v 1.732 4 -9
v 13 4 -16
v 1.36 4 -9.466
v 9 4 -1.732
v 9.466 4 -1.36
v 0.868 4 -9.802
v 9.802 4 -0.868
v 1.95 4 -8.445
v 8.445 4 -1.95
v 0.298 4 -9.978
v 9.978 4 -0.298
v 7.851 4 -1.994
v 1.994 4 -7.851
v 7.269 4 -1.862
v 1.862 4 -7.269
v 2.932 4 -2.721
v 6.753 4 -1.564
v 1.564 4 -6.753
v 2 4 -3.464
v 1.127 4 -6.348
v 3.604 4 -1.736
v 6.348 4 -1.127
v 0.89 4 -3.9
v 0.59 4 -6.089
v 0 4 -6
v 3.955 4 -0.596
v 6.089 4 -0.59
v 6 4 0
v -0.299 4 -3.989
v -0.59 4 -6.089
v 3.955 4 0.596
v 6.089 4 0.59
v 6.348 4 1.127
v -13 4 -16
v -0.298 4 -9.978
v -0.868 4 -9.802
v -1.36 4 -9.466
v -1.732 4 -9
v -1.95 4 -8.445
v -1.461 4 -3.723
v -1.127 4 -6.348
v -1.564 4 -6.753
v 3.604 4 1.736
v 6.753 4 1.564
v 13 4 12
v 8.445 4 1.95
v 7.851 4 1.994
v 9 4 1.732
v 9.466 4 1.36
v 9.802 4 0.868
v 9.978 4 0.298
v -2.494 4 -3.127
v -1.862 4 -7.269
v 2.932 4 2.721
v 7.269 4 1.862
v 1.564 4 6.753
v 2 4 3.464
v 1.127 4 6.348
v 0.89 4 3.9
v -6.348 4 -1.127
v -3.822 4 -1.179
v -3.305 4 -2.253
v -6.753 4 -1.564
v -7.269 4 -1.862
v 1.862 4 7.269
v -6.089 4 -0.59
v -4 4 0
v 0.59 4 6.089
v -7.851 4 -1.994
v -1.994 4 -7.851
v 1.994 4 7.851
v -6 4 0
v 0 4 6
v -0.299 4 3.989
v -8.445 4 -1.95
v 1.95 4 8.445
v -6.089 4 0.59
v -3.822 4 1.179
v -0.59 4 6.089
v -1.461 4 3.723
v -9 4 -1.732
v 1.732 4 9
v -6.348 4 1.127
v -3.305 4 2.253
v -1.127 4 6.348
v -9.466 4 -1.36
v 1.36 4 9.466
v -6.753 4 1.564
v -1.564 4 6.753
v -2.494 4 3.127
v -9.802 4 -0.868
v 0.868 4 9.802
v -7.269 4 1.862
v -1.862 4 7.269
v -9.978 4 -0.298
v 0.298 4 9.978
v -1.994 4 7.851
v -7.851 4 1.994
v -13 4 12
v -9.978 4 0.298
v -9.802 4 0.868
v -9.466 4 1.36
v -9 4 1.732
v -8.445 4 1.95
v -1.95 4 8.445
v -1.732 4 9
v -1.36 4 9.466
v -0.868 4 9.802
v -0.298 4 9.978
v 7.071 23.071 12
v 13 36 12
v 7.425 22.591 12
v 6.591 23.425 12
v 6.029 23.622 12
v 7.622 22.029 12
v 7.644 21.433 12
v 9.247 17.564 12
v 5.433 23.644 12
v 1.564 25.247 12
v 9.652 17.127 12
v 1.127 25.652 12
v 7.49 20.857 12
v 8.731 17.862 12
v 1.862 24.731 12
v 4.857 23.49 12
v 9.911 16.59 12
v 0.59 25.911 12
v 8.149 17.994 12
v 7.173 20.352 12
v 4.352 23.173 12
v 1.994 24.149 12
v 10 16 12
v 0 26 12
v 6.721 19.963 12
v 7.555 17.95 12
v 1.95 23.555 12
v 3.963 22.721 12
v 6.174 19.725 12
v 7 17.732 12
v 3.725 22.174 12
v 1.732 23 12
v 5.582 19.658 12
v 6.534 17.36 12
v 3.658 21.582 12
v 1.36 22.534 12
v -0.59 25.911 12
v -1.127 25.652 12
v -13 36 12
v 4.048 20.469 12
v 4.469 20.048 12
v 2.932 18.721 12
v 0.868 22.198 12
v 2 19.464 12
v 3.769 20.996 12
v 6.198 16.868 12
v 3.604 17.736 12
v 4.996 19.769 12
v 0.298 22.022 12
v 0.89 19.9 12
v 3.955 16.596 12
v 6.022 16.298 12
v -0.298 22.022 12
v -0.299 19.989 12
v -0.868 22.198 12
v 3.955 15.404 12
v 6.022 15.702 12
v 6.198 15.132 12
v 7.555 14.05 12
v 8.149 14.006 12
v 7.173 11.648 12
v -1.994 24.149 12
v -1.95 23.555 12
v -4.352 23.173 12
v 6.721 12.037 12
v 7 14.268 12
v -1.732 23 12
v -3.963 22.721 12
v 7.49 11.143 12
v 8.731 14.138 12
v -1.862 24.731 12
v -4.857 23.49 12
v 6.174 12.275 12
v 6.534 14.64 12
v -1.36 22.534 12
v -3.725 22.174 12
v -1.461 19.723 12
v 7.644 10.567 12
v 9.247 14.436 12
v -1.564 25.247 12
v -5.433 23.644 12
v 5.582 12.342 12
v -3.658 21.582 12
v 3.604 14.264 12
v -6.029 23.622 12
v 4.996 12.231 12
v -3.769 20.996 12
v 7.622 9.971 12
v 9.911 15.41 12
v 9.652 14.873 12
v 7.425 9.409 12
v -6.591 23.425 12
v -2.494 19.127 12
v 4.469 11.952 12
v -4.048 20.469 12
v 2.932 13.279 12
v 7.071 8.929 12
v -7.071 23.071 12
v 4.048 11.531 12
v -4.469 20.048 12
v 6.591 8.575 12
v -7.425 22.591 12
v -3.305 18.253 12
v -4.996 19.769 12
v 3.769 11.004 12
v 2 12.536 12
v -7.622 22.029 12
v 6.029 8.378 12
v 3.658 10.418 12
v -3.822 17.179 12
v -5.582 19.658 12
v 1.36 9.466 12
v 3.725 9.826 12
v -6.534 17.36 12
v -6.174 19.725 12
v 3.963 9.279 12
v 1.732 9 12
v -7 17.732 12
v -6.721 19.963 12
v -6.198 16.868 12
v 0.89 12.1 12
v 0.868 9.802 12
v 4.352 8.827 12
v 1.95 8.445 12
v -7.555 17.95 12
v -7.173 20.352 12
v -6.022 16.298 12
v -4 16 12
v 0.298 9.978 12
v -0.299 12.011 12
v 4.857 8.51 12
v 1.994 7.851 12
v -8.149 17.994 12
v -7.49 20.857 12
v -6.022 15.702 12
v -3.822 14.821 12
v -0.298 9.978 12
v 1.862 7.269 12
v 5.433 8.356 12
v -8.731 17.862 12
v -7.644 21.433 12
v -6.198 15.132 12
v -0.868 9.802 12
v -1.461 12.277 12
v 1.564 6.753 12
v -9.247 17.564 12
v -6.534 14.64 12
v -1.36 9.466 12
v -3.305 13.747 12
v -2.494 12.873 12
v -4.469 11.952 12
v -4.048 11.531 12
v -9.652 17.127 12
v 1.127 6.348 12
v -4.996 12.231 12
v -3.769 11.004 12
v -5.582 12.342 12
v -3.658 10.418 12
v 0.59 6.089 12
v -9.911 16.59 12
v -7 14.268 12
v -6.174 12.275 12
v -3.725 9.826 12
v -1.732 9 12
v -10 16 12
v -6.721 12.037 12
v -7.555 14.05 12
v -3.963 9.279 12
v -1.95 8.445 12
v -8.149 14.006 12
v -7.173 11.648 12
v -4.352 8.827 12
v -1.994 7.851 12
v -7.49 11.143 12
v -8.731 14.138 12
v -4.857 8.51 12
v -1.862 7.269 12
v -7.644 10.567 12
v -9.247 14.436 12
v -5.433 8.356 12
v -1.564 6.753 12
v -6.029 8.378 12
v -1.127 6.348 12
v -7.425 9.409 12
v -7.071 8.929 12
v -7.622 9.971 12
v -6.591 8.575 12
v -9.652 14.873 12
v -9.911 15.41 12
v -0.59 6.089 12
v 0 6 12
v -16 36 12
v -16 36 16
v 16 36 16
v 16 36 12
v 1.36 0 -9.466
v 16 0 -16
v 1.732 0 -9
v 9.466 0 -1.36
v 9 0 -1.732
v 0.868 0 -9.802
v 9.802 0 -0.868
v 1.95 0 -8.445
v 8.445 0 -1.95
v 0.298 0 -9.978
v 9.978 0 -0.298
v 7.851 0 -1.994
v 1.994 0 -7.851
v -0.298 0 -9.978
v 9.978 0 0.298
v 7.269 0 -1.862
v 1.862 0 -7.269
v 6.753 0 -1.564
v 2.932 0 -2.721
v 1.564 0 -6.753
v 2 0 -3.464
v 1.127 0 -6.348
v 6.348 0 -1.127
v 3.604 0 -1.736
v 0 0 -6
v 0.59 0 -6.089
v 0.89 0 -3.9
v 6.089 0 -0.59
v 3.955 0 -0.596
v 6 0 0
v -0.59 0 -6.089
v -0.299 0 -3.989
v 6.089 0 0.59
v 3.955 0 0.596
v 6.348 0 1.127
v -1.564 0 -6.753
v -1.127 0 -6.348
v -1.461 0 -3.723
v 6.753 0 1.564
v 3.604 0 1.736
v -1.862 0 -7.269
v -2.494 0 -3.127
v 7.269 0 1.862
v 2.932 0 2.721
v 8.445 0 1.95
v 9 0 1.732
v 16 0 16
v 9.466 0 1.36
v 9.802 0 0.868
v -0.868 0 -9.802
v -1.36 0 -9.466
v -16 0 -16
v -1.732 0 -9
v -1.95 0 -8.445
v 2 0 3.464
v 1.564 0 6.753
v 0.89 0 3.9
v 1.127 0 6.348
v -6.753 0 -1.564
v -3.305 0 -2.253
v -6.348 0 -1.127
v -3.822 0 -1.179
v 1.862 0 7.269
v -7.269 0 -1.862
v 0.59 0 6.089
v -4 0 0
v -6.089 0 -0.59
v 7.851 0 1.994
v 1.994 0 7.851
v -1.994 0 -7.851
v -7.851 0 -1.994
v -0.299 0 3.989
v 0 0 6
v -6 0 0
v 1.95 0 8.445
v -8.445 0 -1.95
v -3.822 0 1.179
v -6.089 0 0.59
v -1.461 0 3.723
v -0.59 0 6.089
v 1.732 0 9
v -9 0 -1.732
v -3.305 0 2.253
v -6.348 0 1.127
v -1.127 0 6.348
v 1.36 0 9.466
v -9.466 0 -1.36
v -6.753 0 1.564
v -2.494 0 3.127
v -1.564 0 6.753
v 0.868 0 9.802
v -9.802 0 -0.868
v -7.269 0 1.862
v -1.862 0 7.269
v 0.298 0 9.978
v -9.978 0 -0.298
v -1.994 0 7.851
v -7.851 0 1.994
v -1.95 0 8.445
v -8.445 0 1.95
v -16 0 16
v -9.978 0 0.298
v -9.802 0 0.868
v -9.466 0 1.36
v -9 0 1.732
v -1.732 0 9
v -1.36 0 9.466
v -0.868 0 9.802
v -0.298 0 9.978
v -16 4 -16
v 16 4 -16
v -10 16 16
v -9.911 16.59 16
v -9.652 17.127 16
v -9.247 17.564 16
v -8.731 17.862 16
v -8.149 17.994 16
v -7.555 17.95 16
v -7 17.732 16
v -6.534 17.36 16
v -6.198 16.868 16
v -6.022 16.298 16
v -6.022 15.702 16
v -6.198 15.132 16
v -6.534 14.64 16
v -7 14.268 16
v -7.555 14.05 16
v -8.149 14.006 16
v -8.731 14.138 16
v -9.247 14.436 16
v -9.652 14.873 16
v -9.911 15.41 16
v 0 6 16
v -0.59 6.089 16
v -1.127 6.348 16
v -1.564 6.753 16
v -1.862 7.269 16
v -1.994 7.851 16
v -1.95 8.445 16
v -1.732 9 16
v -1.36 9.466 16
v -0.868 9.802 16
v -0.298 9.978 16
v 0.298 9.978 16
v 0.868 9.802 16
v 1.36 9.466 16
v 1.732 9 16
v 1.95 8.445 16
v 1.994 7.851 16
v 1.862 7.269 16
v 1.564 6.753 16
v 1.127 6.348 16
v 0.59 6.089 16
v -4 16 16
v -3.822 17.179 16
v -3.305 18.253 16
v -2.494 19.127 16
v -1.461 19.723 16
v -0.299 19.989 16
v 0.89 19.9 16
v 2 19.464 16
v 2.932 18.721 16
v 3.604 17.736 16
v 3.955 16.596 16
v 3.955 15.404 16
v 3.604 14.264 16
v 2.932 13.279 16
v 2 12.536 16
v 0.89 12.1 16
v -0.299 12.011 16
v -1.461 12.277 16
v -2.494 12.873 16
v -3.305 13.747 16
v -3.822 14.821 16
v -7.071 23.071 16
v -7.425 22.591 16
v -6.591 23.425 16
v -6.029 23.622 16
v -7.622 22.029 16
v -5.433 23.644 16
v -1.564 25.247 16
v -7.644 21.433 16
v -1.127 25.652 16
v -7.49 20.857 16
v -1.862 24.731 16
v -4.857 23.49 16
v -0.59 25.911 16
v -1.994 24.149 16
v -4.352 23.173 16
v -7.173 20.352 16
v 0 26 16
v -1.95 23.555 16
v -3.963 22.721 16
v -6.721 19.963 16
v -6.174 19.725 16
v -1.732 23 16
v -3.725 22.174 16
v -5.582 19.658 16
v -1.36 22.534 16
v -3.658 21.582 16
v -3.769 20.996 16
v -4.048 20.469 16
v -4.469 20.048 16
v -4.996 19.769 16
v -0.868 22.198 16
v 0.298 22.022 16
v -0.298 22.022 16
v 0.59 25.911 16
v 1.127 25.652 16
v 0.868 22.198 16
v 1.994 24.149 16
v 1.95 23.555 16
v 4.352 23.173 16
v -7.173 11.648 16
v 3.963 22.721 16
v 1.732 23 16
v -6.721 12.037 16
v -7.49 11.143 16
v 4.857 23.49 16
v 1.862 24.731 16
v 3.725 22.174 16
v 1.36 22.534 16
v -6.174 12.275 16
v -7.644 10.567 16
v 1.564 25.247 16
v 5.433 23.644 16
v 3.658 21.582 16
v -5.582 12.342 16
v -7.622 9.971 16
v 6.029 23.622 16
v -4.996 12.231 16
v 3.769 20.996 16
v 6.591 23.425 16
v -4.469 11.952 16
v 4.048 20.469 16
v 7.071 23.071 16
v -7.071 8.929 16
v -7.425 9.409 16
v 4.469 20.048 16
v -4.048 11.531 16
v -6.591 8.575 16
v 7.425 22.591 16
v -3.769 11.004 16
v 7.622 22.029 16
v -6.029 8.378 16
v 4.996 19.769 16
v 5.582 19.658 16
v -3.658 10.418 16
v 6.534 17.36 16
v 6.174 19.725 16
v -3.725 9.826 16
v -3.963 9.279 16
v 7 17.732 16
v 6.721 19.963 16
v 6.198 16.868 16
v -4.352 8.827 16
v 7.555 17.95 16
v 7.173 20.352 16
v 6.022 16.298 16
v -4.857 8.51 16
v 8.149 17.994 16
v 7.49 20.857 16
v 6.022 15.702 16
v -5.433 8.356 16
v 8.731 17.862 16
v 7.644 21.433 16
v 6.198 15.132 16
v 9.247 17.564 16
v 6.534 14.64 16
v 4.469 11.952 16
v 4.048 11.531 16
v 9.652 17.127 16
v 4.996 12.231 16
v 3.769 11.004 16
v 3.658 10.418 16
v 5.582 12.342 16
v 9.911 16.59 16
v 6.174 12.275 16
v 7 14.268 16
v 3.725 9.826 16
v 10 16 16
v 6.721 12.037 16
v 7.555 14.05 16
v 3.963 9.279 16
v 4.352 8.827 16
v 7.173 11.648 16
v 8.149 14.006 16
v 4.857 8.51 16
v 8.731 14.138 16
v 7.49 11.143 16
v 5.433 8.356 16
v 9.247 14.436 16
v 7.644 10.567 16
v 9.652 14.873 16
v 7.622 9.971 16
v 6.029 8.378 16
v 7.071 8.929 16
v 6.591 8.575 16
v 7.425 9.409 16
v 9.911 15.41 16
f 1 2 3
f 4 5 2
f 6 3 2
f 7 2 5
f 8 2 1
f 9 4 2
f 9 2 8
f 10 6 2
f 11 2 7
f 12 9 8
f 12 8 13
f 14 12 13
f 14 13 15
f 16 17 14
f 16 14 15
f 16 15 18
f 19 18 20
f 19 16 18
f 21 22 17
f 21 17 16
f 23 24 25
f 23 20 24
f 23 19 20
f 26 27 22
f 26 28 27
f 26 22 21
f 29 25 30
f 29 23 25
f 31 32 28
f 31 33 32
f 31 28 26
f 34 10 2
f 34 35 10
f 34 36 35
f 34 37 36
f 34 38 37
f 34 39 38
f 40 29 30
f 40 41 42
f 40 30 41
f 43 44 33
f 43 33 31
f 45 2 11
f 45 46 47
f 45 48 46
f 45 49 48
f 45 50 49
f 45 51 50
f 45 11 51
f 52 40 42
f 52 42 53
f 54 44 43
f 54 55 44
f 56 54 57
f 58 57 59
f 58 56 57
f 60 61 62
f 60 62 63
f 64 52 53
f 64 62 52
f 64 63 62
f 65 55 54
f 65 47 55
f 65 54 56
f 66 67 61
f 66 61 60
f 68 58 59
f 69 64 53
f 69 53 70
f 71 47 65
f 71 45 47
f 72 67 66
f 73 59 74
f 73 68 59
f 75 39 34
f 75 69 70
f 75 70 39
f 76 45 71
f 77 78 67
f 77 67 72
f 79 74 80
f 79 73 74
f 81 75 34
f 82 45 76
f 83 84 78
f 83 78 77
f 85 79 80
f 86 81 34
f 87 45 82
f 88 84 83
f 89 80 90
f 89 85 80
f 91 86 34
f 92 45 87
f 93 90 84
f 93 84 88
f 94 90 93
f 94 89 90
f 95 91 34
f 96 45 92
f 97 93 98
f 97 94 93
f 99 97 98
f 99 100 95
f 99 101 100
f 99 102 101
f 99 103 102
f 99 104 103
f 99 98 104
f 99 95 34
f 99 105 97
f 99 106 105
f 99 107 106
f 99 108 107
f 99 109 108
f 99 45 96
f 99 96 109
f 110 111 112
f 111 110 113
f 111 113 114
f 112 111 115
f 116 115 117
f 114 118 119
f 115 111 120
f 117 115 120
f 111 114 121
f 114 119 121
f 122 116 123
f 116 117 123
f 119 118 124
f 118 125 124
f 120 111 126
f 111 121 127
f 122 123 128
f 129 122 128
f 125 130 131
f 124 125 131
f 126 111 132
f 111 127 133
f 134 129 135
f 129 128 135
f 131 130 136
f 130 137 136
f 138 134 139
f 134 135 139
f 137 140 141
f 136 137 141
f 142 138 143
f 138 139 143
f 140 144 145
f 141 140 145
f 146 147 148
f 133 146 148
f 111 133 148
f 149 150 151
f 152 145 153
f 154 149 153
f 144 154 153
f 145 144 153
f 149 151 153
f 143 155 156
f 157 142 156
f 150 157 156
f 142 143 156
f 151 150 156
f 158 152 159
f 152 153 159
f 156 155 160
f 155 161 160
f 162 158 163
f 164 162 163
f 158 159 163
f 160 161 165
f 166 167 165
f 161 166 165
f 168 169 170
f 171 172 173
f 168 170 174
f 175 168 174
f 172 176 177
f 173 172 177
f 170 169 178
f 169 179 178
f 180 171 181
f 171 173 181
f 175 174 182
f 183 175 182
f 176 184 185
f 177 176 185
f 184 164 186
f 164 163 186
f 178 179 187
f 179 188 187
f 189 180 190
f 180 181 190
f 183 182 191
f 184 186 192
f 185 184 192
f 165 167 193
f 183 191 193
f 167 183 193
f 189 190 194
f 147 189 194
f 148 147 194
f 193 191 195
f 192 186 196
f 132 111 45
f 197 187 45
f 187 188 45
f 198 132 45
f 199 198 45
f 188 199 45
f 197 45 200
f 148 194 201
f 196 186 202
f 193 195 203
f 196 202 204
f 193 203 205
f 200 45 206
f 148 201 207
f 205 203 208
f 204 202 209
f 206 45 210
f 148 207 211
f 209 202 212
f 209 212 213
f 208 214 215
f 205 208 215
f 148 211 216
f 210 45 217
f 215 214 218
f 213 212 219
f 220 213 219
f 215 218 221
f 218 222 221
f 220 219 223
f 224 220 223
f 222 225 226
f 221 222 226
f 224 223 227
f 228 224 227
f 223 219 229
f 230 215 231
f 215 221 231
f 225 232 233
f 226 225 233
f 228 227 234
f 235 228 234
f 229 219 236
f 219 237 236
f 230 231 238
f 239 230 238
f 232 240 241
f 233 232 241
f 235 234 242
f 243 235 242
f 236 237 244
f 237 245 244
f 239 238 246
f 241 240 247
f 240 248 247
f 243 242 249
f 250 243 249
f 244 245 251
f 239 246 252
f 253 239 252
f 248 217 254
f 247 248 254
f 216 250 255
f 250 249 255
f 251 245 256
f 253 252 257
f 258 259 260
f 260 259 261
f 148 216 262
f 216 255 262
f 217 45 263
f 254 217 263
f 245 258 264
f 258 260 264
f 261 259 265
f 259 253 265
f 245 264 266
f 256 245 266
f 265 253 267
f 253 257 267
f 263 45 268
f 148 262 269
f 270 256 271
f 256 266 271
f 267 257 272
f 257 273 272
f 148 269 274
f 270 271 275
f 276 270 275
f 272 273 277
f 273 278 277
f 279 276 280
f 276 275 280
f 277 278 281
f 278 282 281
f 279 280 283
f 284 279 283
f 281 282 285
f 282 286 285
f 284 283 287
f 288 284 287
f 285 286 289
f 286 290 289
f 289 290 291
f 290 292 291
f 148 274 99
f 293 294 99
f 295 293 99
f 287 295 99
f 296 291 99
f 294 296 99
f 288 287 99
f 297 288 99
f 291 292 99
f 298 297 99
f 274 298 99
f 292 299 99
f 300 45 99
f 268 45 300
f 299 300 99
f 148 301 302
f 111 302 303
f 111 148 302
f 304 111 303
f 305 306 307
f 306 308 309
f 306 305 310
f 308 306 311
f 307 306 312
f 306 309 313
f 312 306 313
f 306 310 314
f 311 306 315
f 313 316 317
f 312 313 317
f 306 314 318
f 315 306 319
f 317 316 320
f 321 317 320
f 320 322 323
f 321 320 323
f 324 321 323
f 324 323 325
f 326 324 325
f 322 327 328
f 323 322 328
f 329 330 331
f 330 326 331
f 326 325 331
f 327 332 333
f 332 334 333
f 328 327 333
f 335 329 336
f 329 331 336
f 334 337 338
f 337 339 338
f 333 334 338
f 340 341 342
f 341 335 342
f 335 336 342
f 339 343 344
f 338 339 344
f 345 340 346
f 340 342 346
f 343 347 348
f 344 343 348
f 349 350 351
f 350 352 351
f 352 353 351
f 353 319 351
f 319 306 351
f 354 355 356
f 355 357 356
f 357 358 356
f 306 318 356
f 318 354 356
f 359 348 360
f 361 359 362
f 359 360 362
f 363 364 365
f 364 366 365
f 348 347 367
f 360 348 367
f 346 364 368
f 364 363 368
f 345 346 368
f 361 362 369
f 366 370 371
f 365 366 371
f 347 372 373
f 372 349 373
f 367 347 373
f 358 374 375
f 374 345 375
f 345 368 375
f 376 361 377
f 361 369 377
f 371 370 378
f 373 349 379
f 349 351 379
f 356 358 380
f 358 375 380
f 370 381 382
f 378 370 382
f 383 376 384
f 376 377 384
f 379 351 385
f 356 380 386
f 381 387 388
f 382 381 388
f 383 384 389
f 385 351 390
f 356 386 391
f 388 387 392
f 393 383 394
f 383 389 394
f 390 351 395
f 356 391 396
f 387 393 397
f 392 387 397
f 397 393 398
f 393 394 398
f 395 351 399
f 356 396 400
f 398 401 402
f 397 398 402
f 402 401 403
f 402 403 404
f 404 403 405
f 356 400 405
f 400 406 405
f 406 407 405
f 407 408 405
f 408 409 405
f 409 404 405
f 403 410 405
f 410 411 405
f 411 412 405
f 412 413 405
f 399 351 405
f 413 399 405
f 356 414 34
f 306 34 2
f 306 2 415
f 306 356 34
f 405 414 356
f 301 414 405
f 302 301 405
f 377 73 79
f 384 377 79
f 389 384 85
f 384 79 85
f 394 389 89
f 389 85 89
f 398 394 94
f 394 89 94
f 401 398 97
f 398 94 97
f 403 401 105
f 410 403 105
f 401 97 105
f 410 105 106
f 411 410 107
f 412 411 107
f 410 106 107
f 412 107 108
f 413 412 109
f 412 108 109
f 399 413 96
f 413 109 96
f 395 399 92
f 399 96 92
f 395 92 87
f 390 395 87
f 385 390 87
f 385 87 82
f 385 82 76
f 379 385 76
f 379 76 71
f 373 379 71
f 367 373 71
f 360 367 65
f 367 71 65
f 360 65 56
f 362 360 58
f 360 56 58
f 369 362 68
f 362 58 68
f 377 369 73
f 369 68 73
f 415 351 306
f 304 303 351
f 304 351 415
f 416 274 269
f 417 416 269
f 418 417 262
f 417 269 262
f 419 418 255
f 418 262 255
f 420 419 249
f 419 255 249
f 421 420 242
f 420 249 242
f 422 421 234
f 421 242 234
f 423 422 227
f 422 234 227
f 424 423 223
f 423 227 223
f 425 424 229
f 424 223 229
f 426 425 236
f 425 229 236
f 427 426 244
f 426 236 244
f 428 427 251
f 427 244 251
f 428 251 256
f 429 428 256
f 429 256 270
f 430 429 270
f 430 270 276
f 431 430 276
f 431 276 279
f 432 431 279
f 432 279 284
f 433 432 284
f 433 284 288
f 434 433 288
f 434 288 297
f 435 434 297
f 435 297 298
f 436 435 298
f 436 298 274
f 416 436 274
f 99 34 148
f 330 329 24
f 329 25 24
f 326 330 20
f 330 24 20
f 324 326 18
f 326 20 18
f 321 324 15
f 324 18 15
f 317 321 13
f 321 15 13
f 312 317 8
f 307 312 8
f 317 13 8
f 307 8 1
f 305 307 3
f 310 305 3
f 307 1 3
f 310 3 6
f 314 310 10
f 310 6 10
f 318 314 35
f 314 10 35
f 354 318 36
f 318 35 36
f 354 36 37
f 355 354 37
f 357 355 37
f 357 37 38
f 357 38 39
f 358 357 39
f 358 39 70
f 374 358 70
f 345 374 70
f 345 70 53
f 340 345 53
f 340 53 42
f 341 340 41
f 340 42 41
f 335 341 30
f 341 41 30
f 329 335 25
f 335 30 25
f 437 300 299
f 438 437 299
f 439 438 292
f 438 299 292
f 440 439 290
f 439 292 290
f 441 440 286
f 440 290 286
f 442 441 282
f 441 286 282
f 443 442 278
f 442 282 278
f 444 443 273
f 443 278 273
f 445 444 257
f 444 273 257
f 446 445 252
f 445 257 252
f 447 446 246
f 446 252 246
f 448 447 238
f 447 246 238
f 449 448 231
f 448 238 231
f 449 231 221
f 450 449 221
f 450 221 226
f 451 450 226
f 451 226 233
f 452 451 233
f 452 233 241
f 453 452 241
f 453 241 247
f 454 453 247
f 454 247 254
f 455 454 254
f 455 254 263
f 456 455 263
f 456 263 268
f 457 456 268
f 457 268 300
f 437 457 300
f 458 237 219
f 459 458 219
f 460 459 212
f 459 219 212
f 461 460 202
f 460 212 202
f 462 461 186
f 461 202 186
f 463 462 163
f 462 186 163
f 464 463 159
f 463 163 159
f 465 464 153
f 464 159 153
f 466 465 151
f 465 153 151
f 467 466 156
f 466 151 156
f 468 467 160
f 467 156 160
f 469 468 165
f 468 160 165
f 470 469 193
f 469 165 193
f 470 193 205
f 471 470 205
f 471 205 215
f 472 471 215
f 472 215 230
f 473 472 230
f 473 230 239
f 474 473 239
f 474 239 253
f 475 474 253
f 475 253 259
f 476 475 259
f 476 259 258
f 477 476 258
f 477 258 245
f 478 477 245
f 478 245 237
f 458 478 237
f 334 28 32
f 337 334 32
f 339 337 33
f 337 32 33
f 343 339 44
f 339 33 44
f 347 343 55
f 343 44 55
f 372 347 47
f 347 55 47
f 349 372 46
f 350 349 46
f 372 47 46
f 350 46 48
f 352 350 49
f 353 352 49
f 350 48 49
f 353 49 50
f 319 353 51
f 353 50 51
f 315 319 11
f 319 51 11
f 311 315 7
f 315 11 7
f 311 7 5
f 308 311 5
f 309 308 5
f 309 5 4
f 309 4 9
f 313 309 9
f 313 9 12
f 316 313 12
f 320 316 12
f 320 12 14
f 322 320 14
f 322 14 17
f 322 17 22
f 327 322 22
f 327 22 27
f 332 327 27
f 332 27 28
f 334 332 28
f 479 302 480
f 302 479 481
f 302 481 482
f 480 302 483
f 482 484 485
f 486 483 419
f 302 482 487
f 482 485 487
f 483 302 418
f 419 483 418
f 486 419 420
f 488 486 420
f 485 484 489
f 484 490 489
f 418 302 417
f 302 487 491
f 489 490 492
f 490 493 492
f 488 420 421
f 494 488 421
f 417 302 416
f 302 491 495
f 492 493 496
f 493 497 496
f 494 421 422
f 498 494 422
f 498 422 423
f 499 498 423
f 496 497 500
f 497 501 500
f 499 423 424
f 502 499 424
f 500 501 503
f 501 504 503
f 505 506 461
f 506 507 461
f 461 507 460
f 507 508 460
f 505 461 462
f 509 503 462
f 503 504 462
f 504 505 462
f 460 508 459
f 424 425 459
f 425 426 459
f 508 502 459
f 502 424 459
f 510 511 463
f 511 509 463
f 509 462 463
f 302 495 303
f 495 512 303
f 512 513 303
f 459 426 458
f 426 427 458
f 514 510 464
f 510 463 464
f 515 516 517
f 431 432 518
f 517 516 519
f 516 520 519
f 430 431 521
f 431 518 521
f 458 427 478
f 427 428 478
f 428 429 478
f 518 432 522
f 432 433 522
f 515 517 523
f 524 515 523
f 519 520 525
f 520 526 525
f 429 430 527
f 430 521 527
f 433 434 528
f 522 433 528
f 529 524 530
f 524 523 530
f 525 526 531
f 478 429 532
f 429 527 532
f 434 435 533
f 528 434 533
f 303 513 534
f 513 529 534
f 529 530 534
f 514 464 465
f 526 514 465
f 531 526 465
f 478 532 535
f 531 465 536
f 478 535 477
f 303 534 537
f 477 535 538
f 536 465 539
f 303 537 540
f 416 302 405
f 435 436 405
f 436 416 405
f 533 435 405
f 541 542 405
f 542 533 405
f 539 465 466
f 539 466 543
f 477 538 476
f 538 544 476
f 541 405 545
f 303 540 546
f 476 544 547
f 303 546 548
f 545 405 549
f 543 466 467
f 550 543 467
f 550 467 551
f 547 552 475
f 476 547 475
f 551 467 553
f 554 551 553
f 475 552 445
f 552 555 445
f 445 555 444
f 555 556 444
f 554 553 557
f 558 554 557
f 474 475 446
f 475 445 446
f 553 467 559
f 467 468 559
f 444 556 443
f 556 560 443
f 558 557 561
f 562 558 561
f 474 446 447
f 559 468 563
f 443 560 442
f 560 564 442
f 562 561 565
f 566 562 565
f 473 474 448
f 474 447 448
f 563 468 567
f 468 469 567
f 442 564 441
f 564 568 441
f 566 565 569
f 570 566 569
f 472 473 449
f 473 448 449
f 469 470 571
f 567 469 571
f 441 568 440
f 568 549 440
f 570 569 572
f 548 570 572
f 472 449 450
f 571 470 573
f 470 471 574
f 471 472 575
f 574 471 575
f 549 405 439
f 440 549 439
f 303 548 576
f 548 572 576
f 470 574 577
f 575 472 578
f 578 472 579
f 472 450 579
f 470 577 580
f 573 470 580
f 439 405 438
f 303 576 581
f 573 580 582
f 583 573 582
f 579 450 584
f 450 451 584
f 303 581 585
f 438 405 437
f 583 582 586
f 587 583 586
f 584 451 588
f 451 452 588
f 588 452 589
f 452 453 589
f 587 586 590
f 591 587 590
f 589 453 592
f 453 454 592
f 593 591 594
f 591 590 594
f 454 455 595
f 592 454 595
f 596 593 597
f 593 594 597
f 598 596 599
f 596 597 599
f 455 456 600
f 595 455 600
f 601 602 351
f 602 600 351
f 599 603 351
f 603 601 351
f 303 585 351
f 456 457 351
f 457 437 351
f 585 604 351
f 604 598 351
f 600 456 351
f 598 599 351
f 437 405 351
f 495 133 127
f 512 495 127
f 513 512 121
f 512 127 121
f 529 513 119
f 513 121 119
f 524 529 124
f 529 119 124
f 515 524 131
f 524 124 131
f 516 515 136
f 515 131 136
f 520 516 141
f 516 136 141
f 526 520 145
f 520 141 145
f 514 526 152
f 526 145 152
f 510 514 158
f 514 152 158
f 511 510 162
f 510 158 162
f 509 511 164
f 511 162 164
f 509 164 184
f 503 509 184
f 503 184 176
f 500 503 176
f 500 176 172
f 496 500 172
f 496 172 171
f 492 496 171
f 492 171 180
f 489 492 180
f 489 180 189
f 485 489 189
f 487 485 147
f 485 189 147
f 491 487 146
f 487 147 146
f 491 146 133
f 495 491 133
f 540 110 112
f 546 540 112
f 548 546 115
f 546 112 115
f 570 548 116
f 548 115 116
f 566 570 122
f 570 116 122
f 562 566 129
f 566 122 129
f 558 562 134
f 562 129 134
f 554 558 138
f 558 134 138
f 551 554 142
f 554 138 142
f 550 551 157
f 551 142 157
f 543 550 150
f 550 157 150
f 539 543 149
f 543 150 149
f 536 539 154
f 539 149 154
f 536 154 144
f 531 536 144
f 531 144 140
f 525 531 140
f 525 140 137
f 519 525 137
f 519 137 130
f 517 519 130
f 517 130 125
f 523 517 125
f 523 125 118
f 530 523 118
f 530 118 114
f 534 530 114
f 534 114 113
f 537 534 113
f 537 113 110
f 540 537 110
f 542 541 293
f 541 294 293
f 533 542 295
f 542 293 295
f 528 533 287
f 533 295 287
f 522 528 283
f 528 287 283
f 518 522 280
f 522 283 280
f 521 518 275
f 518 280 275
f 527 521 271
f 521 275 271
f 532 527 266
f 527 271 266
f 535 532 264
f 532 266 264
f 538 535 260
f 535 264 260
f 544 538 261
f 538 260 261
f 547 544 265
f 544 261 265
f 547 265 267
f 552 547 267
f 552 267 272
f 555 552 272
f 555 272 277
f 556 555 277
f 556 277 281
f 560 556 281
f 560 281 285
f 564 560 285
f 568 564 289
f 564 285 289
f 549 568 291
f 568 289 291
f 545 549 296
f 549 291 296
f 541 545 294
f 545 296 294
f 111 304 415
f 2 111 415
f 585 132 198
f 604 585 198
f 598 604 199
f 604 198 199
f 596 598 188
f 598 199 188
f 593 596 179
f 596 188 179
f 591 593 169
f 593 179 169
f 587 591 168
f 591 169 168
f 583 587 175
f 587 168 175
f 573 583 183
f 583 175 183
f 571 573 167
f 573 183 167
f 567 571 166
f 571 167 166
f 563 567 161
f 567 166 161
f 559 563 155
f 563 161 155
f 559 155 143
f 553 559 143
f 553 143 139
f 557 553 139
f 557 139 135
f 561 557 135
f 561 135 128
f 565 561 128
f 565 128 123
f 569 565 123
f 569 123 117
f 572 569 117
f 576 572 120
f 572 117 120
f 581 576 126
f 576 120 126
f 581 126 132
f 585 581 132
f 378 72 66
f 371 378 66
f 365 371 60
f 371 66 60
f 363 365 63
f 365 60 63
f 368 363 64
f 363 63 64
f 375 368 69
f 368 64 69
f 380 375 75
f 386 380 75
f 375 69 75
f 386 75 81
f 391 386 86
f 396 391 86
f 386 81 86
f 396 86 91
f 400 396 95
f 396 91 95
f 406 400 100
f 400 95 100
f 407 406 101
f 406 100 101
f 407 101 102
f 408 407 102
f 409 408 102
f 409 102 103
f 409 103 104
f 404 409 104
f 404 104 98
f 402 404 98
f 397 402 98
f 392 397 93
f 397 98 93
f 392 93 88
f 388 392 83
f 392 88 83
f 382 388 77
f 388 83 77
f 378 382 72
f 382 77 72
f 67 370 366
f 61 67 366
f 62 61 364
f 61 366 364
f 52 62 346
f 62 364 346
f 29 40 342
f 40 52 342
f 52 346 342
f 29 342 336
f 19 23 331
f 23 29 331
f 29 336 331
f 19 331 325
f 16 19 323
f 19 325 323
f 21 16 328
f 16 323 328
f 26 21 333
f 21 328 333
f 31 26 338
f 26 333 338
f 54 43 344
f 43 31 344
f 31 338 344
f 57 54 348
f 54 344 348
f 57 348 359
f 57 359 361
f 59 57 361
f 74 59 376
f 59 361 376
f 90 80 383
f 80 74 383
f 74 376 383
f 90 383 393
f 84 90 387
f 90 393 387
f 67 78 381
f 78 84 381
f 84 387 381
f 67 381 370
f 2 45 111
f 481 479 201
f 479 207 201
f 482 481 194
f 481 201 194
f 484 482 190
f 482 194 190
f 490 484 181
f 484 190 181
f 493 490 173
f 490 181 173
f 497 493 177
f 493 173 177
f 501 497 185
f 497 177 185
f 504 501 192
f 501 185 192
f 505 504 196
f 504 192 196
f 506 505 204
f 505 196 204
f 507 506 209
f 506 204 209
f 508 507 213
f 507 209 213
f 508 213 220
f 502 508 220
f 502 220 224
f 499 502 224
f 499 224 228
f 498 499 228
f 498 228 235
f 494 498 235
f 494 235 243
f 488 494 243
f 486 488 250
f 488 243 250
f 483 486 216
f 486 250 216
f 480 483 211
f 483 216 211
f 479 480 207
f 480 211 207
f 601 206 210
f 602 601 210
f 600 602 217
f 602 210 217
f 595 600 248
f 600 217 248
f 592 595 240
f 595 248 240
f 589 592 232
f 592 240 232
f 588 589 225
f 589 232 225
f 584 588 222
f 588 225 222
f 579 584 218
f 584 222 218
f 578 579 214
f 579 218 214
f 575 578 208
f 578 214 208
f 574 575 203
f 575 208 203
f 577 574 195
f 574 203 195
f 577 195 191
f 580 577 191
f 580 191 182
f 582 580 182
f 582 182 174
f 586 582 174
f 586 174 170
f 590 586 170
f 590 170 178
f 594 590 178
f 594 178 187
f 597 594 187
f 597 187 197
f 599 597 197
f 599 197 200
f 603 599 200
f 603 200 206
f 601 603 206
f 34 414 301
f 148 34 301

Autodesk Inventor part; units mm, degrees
ref_plane "YZ Plane" through (0, 0, 0) normal (1, 0, 0) x (0, 1, 0)
ref_plane "XZ Plane" through (0, 0, 0) normal (0, 1, 0) x (-1, 0, 0)
ref_plane "XY Plane" through (0, 0, 0) normal (0, 0, 1) x (1, 0, 0)
sketch "Sketch1" plane through (0, 0, 0) normal (0, 1, 0) x (-1, 0, 0)
  line L0 (-16, 16) -> (16, 16)
  line L1 (16, 16) -> (16, -16)
  line L2 (16, -16) -> (-16, -16)
  line L3 (-16, -16) -> (-16, 16)
  line L4 (-16, 16) -> (16, -16) construction
  line L5 (16, 16) -> (-16, -16) construction
  circle A0 centre (0, 0) radius 4
  dimension "d0" = 32
  dimension "d1" = 32
  dimension "d2" = 8
extrude "Extrusion1" add sketch "Sketch1" along normal blind 4
sketch "Sketch2" plane through (0, 4, 0) normal (0, 1, 0) x (1, 0, 0)
  circle A0 centre (-8, 0) radius 2
  point P0 (0, 0)
  dimension "d5" = 4
  dimension "d6" = 8
extrude "Extrusion2" cut sketch "Sketch2" against normal blind 4
pattern_circular "Circular Pattern1" count 4 over 360 about axis through (0, 0, 0) along (0, 1, 0) of "Extrusion2"
sketch "Sketch3" plane through (0, 4, 0) normal (0, 1, 0) x (1, 0, 0)
  line L0 (-16, -16) -> (-16, 16) projected
  line L1 (-16, -16) -> (16, -16)
  line L2 (16, -16) -> (16, -12)
  line L3 (16, -12) -> (-16, -12)
  line L4 (-16, -12) -> (-16, -16)
  point P0 (0, 0)
  dimension "d12" = 32
  dimension "d13" = 4
extrude "Extrusion3" add sketch "Sketch3" along normal blind 32
sketch "Sketch4" plane through (16, 4, 12) normal (0, 0, -1) x (-1, 0, 0)
  line L0 (32, 0) -> (32, 32) construction
  line L1 (0, 0) -> (0, 32) construction
  circle A0 centre (16, 12) radius 4
  point P0 (16, -4)
  dimension "d16" = 8
  dimension "d26" = 32
  dimension "d27" = 12
extrude "Extrusion4" cut sketch "Sketch4" against normal blind 28
sketch "Sketch5" plane through (16, 4, 12) normal (0, 0, -1) x (-1, 0, 0)
  circle A0 centre (24, 12) radius 2
  circle A1 centre (16, 12) radius 4 projected
  point P0 (16, -4)
  dimension "d19" = 4
  dimension "d20" = 8
extrude "Extrusion5" cut sketch "Sketch5" against normal blind 28 contours A0
pattern_circular "Circular Pattern2" count 8 over 360 about axis through (0, 16, 12) along (0, 0, 1) of "Extrusion5"
sketch "Sketch6" plane through (16, 0, 16) normal (1, 0, 0) x (0, 0, -1)
  line L0 (4, 4) -> (4, 36) projected
  line L1 (32, 0) -> (32, 4) projected
  line L2 (4, 36) -> (32, 4)
  line L3 (4, 4) -> (32, 4) projected
  point P0 (16, 0)
extrude "Extrusion6" add sketch "Sketch6" against normal blind 3
mirror "Mirror1" about plane through (0, 0, 0) normal (1, 0, 0) of "Extrusion6"
properties part number "KB33-046-001-002 - Уголок"
